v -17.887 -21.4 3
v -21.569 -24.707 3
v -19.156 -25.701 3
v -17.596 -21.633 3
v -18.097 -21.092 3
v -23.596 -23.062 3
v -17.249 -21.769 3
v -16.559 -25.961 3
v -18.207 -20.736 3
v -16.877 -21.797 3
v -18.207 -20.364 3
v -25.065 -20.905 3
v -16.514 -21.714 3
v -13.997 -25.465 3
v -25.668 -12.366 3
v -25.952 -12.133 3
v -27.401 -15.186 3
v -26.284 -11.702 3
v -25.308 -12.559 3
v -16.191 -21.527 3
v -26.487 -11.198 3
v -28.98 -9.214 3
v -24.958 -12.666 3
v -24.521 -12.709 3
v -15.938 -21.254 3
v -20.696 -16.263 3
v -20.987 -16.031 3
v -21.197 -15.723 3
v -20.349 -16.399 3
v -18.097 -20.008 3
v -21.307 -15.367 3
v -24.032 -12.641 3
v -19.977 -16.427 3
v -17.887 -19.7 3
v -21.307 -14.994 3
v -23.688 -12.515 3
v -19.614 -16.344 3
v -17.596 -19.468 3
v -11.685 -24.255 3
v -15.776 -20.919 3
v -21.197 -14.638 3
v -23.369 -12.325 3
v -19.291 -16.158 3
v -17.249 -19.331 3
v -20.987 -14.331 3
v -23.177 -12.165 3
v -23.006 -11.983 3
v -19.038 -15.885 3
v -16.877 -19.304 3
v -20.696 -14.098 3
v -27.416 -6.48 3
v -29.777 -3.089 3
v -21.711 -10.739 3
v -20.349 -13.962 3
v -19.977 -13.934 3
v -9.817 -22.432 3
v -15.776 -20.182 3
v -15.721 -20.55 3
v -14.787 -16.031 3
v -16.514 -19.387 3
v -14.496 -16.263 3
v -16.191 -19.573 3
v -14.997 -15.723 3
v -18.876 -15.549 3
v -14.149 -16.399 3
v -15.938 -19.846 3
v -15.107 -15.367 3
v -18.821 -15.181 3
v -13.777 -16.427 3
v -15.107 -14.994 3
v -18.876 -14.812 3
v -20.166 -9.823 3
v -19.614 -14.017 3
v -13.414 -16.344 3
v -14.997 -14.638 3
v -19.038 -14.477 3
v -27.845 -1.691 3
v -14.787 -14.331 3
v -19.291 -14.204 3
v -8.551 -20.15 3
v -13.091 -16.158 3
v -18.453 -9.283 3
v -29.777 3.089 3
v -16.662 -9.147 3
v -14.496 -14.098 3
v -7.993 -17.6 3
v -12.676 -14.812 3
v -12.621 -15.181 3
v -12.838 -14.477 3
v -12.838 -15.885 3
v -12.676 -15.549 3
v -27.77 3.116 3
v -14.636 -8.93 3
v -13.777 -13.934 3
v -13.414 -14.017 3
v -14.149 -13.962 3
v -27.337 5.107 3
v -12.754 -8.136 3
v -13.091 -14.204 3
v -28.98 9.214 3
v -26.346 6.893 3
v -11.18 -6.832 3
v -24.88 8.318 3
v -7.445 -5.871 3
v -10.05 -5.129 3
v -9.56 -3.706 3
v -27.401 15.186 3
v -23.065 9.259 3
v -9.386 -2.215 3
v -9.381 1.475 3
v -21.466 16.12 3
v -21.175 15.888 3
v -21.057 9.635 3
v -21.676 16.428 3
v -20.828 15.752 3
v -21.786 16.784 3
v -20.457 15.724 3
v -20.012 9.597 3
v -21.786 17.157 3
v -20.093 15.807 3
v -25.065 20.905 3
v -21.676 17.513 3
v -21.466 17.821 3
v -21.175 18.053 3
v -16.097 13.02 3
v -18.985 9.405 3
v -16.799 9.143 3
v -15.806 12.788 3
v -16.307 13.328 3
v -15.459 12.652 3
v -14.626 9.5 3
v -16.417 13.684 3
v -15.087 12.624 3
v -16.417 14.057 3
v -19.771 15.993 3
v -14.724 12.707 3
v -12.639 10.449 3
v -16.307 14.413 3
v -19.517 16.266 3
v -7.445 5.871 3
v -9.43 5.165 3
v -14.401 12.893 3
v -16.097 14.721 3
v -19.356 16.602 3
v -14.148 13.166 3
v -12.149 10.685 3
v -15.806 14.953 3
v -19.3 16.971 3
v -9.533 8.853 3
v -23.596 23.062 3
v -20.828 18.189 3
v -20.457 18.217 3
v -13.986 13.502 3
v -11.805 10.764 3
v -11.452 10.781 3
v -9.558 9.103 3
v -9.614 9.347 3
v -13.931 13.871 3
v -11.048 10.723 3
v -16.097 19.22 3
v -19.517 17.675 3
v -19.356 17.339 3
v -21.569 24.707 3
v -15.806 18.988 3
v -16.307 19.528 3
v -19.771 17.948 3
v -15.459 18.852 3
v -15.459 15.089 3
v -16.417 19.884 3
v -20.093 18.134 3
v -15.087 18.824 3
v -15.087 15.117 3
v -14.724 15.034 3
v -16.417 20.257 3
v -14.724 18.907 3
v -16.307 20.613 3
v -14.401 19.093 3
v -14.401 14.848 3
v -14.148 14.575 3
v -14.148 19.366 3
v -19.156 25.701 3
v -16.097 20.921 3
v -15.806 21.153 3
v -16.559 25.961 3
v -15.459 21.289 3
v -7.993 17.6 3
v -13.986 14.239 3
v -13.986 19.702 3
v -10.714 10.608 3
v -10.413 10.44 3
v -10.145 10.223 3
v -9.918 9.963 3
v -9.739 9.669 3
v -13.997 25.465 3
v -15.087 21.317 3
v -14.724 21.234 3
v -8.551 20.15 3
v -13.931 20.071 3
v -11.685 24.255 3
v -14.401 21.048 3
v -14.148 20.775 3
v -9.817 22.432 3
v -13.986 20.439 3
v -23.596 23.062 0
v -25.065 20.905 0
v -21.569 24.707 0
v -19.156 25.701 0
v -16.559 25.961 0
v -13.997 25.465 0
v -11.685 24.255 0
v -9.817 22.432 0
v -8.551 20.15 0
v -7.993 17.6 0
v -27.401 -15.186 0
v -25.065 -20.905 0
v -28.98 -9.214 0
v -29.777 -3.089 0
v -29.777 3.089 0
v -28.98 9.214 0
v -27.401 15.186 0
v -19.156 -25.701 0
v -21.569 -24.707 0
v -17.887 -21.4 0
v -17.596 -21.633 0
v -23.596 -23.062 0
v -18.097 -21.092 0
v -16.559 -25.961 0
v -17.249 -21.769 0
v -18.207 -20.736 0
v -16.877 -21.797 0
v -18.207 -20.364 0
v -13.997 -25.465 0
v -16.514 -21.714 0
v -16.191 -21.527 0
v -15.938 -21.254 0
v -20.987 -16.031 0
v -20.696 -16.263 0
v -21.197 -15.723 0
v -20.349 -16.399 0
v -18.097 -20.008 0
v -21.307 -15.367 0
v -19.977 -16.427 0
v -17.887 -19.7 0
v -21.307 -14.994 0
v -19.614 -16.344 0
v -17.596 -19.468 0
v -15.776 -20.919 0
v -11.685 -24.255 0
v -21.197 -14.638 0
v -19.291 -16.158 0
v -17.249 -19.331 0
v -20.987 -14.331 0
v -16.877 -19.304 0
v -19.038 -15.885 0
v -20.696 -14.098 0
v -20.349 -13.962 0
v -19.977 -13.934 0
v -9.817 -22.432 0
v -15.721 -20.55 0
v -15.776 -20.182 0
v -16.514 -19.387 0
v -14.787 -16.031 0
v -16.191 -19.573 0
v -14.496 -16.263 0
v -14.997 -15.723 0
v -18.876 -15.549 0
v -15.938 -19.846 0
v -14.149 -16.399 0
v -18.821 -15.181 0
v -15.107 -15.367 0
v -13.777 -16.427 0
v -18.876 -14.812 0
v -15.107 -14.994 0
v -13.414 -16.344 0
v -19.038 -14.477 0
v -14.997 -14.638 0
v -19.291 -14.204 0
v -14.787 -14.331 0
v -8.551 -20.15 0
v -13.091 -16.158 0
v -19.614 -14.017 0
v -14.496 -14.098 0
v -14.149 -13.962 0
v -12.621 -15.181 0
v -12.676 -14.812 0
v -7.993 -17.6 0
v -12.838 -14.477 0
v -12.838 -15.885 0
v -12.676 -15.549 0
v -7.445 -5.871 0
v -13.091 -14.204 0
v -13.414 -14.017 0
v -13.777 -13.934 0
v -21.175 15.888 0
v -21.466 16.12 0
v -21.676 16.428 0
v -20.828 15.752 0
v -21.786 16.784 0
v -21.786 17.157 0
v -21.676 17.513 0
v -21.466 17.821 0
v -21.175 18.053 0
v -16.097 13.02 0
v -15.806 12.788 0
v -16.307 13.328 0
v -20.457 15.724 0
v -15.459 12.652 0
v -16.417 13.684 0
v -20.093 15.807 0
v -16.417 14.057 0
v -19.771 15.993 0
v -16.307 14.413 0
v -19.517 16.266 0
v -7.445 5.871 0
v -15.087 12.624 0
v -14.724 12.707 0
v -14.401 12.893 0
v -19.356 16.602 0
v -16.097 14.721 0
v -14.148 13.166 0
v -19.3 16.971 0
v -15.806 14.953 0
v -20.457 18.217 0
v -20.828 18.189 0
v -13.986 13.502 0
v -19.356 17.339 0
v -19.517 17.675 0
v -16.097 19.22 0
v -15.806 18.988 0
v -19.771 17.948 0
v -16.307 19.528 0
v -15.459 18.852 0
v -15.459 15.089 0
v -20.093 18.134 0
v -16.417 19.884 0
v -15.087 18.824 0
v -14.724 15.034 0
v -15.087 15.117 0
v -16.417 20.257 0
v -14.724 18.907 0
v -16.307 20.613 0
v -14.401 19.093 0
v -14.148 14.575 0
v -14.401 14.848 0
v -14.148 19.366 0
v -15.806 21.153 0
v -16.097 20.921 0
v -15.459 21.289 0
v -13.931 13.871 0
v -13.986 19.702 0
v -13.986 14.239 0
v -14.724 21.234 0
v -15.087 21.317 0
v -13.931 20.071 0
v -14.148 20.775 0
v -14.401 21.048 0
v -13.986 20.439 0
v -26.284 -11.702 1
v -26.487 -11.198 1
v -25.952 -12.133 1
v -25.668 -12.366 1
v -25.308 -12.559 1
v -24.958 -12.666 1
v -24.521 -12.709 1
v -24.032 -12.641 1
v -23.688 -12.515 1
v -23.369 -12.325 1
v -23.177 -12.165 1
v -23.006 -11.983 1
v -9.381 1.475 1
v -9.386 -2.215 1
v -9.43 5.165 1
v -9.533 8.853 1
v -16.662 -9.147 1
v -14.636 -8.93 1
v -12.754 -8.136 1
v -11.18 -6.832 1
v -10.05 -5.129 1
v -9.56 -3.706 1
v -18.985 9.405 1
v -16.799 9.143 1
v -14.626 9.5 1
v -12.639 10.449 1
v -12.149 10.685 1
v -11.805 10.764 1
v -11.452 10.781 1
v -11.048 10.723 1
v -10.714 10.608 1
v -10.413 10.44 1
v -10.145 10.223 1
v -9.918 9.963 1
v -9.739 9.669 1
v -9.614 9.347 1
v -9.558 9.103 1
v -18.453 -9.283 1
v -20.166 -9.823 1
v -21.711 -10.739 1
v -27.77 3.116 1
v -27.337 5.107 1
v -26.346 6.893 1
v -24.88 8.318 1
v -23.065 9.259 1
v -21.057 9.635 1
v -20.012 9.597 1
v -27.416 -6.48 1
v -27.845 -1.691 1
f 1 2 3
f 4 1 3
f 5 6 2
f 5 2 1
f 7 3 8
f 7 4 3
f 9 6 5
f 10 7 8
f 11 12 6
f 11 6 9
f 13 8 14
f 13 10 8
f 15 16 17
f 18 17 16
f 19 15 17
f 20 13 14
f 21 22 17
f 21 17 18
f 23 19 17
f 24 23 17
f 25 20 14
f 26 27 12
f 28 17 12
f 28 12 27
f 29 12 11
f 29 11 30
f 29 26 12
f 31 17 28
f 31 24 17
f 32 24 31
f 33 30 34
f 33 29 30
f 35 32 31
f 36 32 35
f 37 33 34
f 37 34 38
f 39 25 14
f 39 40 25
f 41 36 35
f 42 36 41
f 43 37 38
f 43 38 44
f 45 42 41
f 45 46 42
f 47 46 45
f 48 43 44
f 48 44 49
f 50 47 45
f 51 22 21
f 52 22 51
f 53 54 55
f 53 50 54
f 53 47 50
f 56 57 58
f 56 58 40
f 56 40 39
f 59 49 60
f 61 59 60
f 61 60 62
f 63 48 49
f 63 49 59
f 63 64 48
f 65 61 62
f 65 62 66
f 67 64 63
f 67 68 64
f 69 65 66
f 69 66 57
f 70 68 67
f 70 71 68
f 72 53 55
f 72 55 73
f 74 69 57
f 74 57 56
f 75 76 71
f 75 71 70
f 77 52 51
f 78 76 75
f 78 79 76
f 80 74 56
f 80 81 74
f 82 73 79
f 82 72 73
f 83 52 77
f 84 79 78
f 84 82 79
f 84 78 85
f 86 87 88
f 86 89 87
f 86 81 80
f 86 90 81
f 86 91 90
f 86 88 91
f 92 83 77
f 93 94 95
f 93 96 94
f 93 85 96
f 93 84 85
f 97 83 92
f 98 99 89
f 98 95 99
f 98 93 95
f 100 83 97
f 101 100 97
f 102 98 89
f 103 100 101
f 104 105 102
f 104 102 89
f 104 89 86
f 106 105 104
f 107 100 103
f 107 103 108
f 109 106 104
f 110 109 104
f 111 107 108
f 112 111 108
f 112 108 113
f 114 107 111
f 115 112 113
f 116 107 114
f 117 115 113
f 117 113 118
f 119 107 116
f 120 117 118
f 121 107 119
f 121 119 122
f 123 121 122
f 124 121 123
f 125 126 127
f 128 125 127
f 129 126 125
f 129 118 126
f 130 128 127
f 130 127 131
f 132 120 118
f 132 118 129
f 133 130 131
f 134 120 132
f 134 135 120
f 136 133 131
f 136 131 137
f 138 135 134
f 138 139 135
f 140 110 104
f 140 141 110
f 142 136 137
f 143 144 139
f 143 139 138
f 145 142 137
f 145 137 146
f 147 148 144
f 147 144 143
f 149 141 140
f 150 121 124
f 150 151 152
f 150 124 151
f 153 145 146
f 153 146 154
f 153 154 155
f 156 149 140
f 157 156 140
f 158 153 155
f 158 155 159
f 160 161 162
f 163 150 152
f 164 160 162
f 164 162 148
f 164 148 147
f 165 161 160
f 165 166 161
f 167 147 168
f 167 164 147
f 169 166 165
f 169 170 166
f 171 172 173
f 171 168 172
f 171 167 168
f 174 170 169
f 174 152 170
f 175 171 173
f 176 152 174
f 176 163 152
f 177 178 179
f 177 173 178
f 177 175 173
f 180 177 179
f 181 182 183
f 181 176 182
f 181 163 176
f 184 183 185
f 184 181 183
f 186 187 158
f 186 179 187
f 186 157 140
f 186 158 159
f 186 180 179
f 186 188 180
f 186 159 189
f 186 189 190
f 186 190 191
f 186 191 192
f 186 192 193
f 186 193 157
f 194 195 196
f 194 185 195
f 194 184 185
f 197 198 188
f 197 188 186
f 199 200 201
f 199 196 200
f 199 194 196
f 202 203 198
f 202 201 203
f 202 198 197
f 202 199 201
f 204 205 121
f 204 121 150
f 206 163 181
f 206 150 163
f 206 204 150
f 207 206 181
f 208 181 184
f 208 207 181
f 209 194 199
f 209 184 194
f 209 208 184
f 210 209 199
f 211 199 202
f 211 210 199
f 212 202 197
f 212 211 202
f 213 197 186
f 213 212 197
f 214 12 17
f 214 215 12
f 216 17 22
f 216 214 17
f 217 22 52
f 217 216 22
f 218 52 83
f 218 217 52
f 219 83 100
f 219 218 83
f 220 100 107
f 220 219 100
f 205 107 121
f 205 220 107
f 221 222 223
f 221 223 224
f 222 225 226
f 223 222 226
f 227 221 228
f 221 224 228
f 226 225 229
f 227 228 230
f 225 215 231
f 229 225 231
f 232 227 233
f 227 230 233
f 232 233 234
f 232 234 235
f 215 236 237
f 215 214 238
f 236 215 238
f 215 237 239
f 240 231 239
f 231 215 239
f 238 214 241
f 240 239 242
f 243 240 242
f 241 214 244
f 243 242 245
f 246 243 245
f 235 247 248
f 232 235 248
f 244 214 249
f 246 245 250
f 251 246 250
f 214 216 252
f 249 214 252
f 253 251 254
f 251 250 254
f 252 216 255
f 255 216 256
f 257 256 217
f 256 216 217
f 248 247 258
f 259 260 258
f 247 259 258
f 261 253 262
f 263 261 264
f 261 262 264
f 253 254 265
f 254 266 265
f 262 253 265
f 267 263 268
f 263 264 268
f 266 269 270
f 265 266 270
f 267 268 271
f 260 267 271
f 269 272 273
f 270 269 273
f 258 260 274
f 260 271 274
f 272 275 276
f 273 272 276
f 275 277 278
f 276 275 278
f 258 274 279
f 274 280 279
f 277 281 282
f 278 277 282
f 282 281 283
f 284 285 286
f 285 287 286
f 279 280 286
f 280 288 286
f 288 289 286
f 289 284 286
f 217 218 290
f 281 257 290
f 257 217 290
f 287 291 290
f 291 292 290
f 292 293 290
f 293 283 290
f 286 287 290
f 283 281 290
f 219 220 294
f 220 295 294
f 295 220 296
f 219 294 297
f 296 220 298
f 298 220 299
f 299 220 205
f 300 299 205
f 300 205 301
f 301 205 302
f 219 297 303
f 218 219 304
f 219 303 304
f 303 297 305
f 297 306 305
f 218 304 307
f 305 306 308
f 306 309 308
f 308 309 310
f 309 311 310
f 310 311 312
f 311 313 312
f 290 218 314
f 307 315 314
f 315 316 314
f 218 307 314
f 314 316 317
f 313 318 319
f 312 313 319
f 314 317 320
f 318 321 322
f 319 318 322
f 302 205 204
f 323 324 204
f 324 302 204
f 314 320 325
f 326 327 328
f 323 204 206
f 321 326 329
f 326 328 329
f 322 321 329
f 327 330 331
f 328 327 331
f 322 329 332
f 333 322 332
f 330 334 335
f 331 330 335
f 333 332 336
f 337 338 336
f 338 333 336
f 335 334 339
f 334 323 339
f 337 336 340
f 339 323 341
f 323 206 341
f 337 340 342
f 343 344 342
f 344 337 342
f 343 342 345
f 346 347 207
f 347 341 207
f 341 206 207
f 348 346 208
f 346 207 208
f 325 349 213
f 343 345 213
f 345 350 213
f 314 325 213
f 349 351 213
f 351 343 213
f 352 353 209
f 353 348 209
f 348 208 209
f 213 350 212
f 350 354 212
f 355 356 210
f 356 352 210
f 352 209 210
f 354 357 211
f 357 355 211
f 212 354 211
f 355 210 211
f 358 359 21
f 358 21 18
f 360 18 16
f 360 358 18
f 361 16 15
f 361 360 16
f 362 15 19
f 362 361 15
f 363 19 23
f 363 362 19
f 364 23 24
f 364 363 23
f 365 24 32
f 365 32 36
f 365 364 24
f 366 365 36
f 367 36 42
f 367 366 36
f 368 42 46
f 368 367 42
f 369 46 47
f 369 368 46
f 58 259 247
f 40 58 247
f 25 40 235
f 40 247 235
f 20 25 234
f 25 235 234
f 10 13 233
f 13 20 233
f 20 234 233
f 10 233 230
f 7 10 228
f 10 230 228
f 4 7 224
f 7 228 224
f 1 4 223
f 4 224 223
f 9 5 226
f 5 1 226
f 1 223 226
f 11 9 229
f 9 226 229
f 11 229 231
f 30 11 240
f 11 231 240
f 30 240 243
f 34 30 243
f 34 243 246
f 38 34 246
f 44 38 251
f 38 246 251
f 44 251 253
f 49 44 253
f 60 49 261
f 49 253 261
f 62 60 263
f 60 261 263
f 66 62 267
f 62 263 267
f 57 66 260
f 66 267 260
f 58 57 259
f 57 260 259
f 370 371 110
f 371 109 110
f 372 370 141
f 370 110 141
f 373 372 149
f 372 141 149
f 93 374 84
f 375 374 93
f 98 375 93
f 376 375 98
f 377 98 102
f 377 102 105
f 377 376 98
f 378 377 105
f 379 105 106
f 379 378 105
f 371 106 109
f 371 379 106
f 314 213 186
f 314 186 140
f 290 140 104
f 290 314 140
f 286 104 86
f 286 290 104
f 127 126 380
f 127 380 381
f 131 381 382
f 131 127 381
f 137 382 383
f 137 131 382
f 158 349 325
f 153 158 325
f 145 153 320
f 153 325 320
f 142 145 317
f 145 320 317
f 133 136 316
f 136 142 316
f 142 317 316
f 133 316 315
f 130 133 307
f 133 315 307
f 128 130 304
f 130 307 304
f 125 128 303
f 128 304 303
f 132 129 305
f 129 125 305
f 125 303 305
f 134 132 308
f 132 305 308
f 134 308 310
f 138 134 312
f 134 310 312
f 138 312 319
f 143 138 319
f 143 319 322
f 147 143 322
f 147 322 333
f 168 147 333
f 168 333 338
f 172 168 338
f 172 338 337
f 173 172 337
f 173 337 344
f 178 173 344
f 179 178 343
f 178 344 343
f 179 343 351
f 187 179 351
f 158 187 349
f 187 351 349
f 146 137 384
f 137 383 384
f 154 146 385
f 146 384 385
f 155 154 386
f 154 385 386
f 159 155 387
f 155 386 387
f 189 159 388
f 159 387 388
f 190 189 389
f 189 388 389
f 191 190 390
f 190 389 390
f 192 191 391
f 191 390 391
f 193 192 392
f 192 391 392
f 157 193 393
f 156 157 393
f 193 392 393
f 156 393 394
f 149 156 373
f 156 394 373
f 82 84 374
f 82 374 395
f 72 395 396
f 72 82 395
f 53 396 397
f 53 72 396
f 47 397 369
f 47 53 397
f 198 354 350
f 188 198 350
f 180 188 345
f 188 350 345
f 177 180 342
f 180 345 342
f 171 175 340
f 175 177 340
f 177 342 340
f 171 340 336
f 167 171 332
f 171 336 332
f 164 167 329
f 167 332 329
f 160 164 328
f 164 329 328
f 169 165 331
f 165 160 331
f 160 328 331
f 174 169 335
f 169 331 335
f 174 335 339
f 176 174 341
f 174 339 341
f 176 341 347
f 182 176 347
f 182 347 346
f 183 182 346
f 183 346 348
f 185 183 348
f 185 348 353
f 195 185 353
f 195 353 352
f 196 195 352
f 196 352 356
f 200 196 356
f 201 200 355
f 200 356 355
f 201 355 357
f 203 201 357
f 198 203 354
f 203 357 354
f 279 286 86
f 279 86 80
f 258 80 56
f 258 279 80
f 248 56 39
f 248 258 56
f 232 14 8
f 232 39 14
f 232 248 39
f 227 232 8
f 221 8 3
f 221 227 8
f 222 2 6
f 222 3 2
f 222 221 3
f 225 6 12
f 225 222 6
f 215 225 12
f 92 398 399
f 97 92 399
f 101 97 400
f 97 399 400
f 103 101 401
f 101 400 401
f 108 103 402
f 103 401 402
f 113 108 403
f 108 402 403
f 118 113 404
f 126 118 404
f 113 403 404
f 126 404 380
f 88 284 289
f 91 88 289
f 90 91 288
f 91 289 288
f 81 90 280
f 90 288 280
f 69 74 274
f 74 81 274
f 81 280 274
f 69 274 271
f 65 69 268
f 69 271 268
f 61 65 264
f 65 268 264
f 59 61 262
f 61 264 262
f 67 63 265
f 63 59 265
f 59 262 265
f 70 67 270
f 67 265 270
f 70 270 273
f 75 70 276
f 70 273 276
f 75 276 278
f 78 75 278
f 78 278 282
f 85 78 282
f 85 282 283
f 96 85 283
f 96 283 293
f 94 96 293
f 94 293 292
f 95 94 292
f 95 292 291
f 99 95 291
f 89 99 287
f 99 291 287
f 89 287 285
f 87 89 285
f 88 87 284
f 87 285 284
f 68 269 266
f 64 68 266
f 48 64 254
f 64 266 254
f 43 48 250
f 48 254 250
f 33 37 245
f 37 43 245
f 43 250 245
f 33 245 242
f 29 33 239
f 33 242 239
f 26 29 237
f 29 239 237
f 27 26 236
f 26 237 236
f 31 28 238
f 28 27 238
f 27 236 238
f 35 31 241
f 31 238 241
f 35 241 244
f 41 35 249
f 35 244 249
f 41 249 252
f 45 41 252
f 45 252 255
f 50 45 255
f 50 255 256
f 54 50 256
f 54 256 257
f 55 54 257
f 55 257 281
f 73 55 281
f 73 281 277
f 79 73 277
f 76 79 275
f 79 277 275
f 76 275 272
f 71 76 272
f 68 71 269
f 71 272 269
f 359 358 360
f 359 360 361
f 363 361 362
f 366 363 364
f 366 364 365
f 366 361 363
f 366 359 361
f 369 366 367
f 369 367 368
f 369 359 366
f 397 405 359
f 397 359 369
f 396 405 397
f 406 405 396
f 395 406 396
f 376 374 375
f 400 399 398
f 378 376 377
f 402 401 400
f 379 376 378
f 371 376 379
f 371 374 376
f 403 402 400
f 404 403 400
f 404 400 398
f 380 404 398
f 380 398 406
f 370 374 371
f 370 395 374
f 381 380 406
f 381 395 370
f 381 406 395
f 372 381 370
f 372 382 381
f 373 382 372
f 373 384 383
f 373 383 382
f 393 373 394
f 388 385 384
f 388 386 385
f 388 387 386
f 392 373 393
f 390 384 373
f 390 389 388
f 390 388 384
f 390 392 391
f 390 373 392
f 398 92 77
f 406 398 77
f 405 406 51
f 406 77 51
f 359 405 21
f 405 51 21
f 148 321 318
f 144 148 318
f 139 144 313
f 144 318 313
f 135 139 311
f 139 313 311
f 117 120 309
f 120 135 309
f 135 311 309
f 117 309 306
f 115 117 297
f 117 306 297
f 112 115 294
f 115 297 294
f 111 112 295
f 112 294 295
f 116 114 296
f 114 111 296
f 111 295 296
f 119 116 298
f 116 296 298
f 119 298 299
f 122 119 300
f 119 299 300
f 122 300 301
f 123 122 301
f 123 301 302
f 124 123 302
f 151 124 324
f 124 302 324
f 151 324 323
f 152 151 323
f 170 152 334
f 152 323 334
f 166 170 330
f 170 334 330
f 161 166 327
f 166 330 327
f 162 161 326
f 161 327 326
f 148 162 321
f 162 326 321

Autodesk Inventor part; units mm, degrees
ref_plane "YZ Plane" through (0, 0, 0) normal (1, 0, 0) x (0, 1, 0)
ref_plane "XZ Plane" through (0, 0, 0) normal (0, 1, 0) x (-1, 0, 0)
ref_plane "XY Plane" through (0, 0, 0) normal (0, 0, 1) x (1, 0, 0)
sketch "Sketch1" plane through (0, 0, 0) normal (0, 0, 1) x (1, 0, 0)
  line L0 (-15.8764, 0) -> (-29.8764, 0)
  line L1 (-15.8764, 0) -> (-7.3764, 0)
  line L2 (-25.9706, 16.9706) -> (-25.9706, -16.9706) construction
  line L3 (-7.9706, -16.9706) -> (-7.9706, 16.9706) construction
  arc A0 (-7.9706, 16.9706) -> (-7.9926, 17.6) centre (-16.9706, 16.9706) ccw construction
  arc A1 (-25.9706, -16.9706) -> (-25.0651, -20.9049) centre (-16.9706, -16.9706) ccw construction
  arc A2 (-25.0651, 20.9049) -> (-25.0651, -20.9049) centre (17.9444, 0) ccw
  arc A3 (-7.9926, -17.6) -> (-7.9926, 17.6) centre (-259.0334, 0) ccw
  arc A4 (-25.0651, 20.9049) -> (-25.9706, 16.9706) centre (-16.9706, 16.9706) ccw construction
  arc A5 (-25.0651, -20.9049) -> (-7.9926, -17.6) centre (-16.9706, -16.9706) ccw
  arc A6 (-7.9926, 17.6) -> (-25.0651, 20.9049) centre (-16.9706, 16.9706) ccw
  arc A7 (-7.9926, -17.6) -> (-7.9706, -16.9706) centre (-16.9706, -16.9706) ccw construction
  line L4 (-16.9706, -20.5501) -> (-20.0706, -15.1808) construction
  line L5 (-20.0706, -15.1808) -> (-13.8706, -15.1808) construction
  line L6 (-13.8706, -15.1808) -> (-16.9706, -20.5501) construction
  circle A8 centre (-20.0706, -15.1808) radius 1.25
  circle A9 centre (-13.8706, -15.1808) radius 1.25
  circle A10 centre (-16.9706, -20.5501) radius 1.25
  line L7 (0, 0) -> (-43.2466, 0) construction
  line L8 (-15.1808, 20.0706) -> (-15.1808, 13.8706) construction
  line L9 (-15.1808, 13.8706) -> (-20.5501, 16.9706) construction
  line L10 (-20.5501, 16.9706) -> (-15.1808, 20.0706) construction
  circle A11 centre (-15.1808, 13.8706) radius 1.25
  circle A12 centre (-20.5501, 16.9706) radius 1.25
  circle A13 centre (-15.1808, 20.0706) radius 1.25
  line L11 (-16.9706, 16.9706) -> (0, 0) construction
  line L12 (-16.9706, -16.9706) -> (0, 0) construction
  point P0 (-29.8764, 0)
  point P1 (-7.3764, 0)
  dimension "d11" = 9
  dimension "d14" = 2.5
  dimension "d15" = 2.5
  dimension "d16" = 2.5
  dimension "d17" = 6.2
  dimension "d19" = 2.5
  dimension "d20" = 2.5
  dimension "d21" = 2.5
  dimension "d22" = 6.2
  dimension "d23" = 24
  dimension "d24" = 45
  dimension "d25" = 24
  dimension "d26" = 45
  dimension "d27" = 14
  dimension "d28" = 8.5
extrude "Extrusion1" add sketch "Sketch1" along normal blind 3
sketch "Sketch2" plane through (0, 0, 3) normal (0, 0, 1) x (1, 0, 0)
  arc A0 (-25.0651, 20.9049) -> (-25.0651, -20.9049) centre (17.9444, 0) ccw projected
  arc A1 (-25.0651, -20.9049) -> (-7.9926, -17.6) centre (-16.9706, -16.9706) ccw projected
  arc A2 (-7.9926, -17.6) -> (-7.9926, 17.6) centre (-259.0334, 0) ccw projected
  arc A3 (-7.9926, 17.6) -> (-25.0651, 20.9049) centre (-16.9706, 16.9706) ccw projected
  circle A4 centre (-16.9706, -20.5501) radius 1.25 projected
  circle A5 centre (-13.8706, -15.1808) radius 1.25 projected
  circle A6 centre (-20.0706, -15.1808) radius 1.25 projected
  circle A7 centre (-15.1808, 13.8706) radius 1.25 projected
  circle A8 centre (-15.1808, 20.0706) radius 1.25 projected
  circle A9 centre (-20.5501, 16.9706) radius 1.25 projected
  arc A10 (-23.2663, 20.0306) -> (-23.2663, -20.0306) centre (17.9444, 0) ccw
  arc A11 (-9.9877, 17.4601) -> (-23.2663, 20.0306) centre (-16.9706, 16.9706) ccw
  arc A12 (-9.9877, -17.4601) -> (-9.9877, 17.4601) centre (-259.0334, 0) ccw
  arc A13 (-23.2663, -20.0306) -> (-9.9877, -17.4601) centre (-16.9706, -16.9706) ccw
  circle A14 centre (-15.1808, 13.8706) radius 4.25
  circle A15 centre (-16.9706, 16.9706) radius 7.8296
  circle A16 centre (-16.9706, -16.9706) radius 7.8296
  line L0 (-9.7642, 13.9095) -> (10.6825, 13.9095)
  point P0 (0, 0)
  point P1 (-24.7881, -16.5371)
  point P2 (-9.7642, -13.9095)
  point P3 (-24.7881, 16.5371)
  dimension "d33" = 15.6591
  dimension "d31" = 2
  dimension "d32" = 3
  dimension "d34" = 15.6591
extrude "Extrusion2" cut sketch "Sketch2" against normal blind 2 contours A15 A12 A16 A10
fillet "Fillet1" radius 7 2 edges at (-24.7881, 16.5371, 2) (-9.7642, -13.9095, 2)
fillet "Fillet2" radius 2 2 edges at (-9.7642, 13.9095, 2) (-24.7881, -16.5371, 2)
sketch "Sketch3" plane through (0, 0, 3) normal (0, 0, 1) x (1, 0, 0)
  arc A0 (-18.9853, 9.4046) -> (-12.6387, 10.4485) centre (-16.9706, 16.9706) ccw projected
  arc A1 (-9.5334, 8.8534) -> (-12.6387, 10.4485) centre (-11.5322, 8.7825) ccw projected
  arc A2 (-9.3862, -2.2146) -> (-9.5334, 8.8534) centre (-259.0334, 0) ccw projected
  arc A3 (-16.6619, -9.1471) -> (-9.3862, -2.2146) centre (-16.386, -2.1525) ccw projected
  arc A4 (-16.6619, -9.1471) -> (-23.006, -11.983) centre (-16.9706, -16.9706) ccw projected
  arc A5 (-26.4871, -11.1978) -> (-23.006, -11.983) centre (-24.5477, -10.709) ccw projected
  arc A6 (-27.7703, 3.1165) -> (-26.4871, -11.1978) centre (17.9444, 0) ccw projected
  arc A7 (-18.9853, 9.4046) -> (-27.7703, 3.1165) centre (-20.7865, 2.6404) ccw projected
  arc A8 (-25.0651, 20.9049) -> (-25.0651, -20.9049) centre (17.9444, 0) ccw projected
  arc A9 (-25.0651, -20.9049) -> (-7.9926, -17.6) centre (-16.9706, -16.9706) ccw projected
  arc A10 (-7.9926, -17.6) -> (-7.9926, 17.6) centre (-259.0334, 0) ccw projected
  arc A11 (-7.9926, 17.6) -> (-25.0651, 20.9049) centre (-16.9706, 16.9706) ccw projected
  circle A12 centre (-16.9706, -20.5501) radius 1.25 projected
  circle A13 centre (-13.8706, -15.1808) radius 1.25 projected
  circle A14 centre (-20.0706, -15.1808) radius 1.25 projected
  circle A15 centre (-15.1808, 13.8706) radius 1.25 projected
  circle A16 centre (-15.1808, 20.0706) radius 1.25 projected
  circle A17 centre (-20.5501, 16.9706) radius 1.25 projected
  point P0 (0, 0)
equation "\"d34\" = d33"
properties part number "クランク"
